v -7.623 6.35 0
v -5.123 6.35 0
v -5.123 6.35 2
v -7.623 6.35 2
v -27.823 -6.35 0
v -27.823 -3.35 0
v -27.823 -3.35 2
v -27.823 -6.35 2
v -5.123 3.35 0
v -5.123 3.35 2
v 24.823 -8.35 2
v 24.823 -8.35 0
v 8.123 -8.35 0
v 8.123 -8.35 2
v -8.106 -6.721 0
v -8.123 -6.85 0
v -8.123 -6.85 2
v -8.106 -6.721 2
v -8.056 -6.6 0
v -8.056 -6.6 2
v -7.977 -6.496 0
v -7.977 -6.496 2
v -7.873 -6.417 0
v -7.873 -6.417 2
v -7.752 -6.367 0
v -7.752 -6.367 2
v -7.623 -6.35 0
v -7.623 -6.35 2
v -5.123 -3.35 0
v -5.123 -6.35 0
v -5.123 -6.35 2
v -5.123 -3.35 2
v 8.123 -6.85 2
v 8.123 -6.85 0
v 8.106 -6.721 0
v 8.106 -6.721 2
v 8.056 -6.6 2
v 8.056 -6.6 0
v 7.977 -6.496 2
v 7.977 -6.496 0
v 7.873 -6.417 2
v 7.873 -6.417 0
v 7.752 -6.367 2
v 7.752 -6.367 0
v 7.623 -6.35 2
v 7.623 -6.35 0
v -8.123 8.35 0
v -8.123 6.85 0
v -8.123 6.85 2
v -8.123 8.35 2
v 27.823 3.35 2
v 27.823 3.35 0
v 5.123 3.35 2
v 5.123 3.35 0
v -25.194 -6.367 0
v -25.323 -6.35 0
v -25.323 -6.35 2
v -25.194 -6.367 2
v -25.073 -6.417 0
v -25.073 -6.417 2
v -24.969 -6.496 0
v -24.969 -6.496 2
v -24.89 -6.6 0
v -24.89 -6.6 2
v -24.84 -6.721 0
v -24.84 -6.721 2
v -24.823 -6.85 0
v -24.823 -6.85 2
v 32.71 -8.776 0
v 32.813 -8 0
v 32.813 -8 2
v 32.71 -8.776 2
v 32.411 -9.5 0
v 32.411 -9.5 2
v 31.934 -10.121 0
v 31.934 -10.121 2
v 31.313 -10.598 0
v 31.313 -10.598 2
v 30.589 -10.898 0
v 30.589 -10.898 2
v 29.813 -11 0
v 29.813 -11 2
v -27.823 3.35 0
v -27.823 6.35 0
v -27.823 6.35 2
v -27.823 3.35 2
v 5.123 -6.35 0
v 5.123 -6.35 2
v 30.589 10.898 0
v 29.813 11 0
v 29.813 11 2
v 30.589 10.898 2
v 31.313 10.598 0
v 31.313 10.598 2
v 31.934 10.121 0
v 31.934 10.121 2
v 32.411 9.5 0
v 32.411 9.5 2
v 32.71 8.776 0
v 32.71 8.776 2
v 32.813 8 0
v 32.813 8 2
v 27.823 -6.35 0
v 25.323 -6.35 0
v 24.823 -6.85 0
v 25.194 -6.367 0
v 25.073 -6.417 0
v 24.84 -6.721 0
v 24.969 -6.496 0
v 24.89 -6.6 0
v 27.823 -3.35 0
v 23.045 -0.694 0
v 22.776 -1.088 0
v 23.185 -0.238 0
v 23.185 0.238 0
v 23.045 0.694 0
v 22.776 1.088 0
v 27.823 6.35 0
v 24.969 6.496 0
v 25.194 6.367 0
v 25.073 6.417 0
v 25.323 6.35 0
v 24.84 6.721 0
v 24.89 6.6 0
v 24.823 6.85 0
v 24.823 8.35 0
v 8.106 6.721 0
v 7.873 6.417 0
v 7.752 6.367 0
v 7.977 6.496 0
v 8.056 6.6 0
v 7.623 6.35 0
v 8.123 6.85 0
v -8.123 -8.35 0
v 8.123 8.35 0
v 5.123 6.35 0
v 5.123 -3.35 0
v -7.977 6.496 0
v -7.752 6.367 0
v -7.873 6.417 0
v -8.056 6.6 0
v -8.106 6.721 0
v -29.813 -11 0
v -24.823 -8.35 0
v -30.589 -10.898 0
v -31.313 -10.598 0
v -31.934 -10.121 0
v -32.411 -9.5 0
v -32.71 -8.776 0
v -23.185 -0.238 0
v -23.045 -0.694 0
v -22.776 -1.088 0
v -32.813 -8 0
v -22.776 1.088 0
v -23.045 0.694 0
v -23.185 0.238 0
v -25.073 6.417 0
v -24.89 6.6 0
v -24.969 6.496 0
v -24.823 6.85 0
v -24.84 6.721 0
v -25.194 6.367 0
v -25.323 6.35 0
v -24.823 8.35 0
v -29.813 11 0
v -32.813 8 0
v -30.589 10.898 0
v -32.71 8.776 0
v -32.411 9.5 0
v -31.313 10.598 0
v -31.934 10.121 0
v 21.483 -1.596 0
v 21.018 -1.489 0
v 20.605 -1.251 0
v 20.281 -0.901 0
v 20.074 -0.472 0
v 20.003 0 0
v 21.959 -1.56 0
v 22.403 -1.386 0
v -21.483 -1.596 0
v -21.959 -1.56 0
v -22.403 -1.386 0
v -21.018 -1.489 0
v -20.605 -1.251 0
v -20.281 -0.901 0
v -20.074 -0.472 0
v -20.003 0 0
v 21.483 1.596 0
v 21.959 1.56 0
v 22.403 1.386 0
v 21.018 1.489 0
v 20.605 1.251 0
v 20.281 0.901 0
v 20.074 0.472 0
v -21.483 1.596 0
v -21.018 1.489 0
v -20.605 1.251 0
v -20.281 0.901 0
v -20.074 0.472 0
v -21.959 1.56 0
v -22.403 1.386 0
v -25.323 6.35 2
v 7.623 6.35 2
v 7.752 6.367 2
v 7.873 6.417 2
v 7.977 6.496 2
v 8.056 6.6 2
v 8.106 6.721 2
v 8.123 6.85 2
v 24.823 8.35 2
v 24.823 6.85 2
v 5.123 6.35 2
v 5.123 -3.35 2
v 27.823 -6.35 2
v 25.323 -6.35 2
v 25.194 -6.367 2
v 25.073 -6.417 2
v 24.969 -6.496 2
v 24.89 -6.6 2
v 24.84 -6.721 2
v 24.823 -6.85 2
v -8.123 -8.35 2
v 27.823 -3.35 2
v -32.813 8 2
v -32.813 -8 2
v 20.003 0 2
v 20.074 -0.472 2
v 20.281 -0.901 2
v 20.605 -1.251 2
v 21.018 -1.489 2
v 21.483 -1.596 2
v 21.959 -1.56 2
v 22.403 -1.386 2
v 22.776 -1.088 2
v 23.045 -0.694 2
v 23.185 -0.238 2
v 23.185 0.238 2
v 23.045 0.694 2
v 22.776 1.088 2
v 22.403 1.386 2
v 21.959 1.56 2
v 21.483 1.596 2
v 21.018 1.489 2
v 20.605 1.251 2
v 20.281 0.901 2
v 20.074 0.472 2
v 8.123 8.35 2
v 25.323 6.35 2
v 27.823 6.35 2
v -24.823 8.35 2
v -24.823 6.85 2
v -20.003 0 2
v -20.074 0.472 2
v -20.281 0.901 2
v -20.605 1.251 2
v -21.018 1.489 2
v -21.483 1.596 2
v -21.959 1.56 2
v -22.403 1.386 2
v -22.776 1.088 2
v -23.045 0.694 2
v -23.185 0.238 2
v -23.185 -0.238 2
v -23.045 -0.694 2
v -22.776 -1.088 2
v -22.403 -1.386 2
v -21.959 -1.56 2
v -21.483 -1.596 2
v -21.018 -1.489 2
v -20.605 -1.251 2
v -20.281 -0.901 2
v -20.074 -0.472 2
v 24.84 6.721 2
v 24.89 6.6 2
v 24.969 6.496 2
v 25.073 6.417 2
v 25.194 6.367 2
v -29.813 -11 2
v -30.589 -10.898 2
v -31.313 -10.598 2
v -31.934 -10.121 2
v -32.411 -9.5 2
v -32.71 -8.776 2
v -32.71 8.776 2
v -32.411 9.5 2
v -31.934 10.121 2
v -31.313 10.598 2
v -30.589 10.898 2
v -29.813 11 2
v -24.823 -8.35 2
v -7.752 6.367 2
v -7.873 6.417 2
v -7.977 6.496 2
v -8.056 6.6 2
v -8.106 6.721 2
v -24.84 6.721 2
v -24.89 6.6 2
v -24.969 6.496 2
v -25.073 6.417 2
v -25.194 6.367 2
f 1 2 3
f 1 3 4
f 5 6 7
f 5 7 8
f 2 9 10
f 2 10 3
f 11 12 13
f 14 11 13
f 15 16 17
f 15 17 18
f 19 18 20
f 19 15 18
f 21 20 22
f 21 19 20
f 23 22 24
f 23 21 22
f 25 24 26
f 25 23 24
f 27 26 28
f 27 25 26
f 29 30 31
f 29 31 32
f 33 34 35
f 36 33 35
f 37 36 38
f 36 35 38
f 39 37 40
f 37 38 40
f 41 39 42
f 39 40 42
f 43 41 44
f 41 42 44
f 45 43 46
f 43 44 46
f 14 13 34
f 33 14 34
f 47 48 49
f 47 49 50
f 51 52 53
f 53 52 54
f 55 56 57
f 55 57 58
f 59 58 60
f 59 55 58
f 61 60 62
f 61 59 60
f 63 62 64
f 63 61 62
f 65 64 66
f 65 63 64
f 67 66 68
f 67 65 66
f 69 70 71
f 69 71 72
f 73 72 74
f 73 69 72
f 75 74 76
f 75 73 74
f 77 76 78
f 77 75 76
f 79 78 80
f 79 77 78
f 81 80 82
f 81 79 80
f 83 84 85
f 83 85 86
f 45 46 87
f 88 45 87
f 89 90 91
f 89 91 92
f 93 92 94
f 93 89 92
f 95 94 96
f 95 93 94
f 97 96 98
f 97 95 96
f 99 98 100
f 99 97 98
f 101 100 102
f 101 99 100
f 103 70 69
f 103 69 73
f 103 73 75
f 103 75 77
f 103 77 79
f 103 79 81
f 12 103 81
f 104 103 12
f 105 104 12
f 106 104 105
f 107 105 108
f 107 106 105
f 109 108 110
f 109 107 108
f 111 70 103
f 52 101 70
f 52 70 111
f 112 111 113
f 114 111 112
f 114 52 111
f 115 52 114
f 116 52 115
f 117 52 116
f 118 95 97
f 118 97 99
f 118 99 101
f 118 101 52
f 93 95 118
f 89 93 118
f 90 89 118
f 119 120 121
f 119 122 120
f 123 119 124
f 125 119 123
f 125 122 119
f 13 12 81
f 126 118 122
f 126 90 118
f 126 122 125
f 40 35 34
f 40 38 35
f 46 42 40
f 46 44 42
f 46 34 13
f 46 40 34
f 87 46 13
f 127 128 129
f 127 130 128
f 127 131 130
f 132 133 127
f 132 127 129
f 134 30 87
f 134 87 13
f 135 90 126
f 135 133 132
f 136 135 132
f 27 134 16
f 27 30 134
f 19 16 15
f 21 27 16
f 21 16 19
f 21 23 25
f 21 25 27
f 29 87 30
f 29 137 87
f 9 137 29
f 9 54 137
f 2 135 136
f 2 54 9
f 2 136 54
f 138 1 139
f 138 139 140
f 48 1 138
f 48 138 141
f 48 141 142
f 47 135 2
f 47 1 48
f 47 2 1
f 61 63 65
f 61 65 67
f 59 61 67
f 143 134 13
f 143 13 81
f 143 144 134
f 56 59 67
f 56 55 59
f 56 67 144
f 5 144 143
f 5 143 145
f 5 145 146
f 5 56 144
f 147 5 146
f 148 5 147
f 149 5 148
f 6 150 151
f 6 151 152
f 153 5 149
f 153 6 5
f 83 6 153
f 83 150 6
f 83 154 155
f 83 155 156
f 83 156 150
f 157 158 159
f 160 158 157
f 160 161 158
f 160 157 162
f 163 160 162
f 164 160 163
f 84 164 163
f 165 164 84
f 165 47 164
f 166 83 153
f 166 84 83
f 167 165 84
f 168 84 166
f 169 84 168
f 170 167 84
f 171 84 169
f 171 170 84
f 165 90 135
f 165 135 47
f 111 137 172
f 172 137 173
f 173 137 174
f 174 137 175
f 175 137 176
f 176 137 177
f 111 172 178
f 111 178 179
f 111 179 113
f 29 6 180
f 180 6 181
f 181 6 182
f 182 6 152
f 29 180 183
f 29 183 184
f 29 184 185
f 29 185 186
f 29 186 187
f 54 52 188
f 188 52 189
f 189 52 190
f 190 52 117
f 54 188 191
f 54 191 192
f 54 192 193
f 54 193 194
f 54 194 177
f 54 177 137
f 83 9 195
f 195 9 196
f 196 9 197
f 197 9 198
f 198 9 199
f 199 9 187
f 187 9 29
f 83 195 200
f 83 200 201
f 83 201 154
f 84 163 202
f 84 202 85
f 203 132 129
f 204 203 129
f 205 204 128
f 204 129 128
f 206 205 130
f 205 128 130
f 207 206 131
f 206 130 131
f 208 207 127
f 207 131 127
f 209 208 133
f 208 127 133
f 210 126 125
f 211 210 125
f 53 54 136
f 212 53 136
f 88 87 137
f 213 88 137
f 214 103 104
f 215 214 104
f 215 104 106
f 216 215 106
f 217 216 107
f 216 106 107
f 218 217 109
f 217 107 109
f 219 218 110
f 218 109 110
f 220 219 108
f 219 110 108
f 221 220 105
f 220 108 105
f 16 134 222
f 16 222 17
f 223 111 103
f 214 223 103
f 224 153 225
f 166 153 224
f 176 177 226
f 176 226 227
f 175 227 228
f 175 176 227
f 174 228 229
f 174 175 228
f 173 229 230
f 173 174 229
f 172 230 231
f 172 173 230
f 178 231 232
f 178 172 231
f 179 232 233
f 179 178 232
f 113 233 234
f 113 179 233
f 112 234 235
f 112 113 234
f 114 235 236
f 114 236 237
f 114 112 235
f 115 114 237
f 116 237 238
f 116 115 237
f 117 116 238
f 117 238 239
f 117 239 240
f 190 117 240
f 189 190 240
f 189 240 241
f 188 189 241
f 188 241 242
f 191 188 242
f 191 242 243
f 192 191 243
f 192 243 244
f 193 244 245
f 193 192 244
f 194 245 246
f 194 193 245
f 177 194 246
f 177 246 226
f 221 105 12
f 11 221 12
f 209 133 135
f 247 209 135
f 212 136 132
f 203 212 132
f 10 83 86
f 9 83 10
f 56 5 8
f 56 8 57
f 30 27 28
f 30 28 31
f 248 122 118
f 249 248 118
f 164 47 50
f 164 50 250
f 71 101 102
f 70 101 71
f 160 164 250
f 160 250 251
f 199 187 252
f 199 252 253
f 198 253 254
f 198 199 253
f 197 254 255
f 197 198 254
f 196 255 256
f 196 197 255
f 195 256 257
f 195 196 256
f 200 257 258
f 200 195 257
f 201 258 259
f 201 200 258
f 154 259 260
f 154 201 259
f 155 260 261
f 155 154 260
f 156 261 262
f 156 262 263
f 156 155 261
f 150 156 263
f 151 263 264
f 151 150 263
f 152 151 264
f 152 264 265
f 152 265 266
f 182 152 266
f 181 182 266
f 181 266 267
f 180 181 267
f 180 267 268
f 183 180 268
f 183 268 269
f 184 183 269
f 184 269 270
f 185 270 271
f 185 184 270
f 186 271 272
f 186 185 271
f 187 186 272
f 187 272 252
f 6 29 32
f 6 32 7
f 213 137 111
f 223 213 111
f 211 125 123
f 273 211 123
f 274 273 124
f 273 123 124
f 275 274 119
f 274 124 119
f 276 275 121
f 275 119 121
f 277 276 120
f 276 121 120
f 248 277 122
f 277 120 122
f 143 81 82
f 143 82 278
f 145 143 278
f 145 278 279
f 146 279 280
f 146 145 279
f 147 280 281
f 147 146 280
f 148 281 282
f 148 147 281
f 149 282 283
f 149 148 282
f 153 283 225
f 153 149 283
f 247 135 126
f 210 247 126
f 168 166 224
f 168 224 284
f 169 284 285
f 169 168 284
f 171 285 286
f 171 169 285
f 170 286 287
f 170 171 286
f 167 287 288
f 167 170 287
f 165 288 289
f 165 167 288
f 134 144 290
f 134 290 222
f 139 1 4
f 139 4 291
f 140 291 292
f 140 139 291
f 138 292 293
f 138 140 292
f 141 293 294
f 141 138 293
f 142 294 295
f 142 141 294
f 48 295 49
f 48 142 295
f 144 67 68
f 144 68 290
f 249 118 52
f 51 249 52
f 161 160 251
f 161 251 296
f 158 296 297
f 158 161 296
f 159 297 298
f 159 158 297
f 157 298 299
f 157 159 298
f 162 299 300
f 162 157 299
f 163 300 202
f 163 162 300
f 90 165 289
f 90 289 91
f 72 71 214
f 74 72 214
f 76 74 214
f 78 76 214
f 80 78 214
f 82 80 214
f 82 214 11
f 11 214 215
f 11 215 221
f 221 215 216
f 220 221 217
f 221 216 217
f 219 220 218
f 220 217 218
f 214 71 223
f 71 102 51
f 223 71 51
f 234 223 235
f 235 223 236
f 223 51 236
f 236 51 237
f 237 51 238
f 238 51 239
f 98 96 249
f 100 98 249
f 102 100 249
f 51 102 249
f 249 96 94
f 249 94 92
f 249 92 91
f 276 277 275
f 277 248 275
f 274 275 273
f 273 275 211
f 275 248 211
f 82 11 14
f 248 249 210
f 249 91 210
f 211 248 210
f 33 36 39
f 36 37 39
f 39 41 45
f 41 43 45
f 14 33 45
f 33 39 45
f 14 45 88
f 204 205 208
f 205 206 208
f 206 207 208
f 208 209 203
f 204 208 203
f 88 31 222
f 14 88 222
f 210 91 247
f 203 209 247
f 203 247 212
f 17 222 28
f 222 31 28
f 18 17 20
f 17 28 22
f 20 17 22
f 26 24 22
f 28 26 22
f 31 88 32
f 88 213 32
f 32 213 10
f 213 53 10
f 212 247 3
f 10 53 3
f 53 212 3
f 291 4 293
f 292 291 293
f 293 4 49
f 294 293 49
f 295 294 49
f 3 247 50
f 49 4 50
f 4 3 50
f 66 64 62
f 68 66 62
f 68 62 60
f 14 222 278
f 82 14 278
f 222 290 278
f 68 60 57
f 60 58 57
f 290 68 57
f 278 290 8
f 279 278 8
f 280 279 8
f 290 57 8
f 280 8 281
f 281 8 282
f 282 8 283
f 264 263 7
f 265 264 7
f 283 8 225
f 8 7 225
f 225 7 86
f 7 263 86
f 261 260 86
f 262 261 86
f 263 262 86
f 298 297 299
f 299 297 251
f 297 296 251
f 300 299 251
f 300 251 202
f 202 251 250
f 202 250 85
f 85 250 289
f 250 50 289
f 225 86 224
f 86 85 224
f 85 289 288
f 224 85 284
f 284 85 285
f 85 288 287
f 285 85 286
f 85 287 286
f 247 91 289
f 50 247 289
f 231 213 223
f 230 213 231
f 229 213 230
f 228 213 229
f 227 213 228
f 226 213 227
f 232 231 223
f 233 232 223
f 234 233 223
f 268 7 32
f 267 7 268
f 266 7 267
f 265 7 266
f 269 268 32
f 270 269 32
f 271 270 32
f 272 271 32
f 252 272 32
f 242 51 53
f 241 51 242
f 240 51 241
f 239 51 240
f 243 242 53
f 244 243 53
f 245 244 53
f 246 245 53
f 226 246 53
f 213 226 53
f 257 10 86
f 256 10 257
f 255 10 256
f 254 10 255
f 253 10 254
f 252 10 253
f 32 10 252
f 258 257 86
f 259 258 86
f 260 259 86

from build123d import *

# Parameters (mm, degrees)
SKETCH_1_R      = 1.6
EXTRUDE_1_DEPTH = 2


with BuildPart() as part:
    # 草图1 → 凸台-拉伸1 (new body)
    with BuildSketch(Plane.XY):
        with BuildLine():
            Line((-29.812520549, 11), (29.812520549, 11))
            ThreePointArc((29.812520549, 11), (31.933840892, 10.121320344), (32.812520549, 8))
            Line((32.812520549, 8), (32.812520549, -8))
            ThreePointArc((32.812520549, -8), (31.933840892, -10.121320344), (29.812520549, -11))
            Line((29.812520549, -11), (-29.812520549, -11))
            ThreePointArc((-29.812520549, -11), (-31.933840892, -10.121320344), (-32.812520549, -8))
            Line((-32.812520549, -8), (-32.812520549, 8))
            ThreePointArc((-32.812520549, 8), (-31.933840892, 10.121320344), (-29.812520549, 11))
        make_face()
        with Locations((-21.602967139, 3e-09)):
            Circle(SKETCH_1_R, mode=Mode.SUBTRACT)
        with Locations(Location((21.602967139, 3e-09, 0), (0, 0, 180))):
            Circle(SKETCH_1_R, mode=Mode.SUBTRACT)
        with BuildLine():
            Line((-27.82296712, -6.350000006), (-25.322967139, -6.350000006))
            ThreePointArc((-25.322967139, -6.350000006), (-24.969413752, -6.496446613), (-24.822967144, -6.850000001))
            Line((-24.822967144, -6.850000001), (-24.822967144, -8.350000009))
            Line((-24.822967144, -8.350000009), (-8.122967147, -8.350000009))
            Line((-8.122967147, -8.350000009), (-8.122967147, -6.850000006))
            ThreePointArc((-8.122967147, -6.850000006), (-7.976520539, -6.496446619), (-7.622967152, -6.350000011))
            Line((-7.622967152, -6.350000011), (-5.122967162, -6.350000011))
            Line((-5.122967162, -6.350000011), (-5.122967162, -3.349999976))
            Line((-5.122967162, -3.349999976), (-27.82296712, -3.349999976))
            Line((-27.82296712, -3.349999976), (-27.82296712, -6.350000006))
        make_face(mode=Mode.SUBTRACT)
        with BuildLine():
            Line((-8.12296715, 8.350000017), (-24.822967148, 8.350000017))
            Line((-24.822967148, 8.350000017), (-24.822967148, 6.850000008))
            ThreePointArc((-24.822967148, 6.850000008), (-24.969413756, 6.496446621), (-25.322967143, 6.350000013))
            Line((-25.322967143, 6.350000013), (-27.822967124, 6.350000013))
            Line((-27.822967124, 6.350000013), (-27.822967124, 3.349999975))
            Line((-27.822967124, 3.349999975), (-5.122967149, 3.349999975))
            Line((-5.122967149, 3.349999975), (-5.122967149, 6.350000013))
            Line((-5.122967149, 6.350000013), (-7.622967155, 6.350000013))
            ThreePointArc((-7.622967155, 6.350000013), (-7.976520542, 6.496446621), (-8.12296715, 6.850000008))
            Line((-8.12296715, 6.850000008), (-8.12296715, 8.350000017))
        make_face(mode=Mode.SUBTRACT)
        with BuildLine():
            Line((24.822967148, 8.350000017), (24.822967148, 6.850000008))
            ThreePointArc((24.822967148, 6.850000008), (24.969413756, 6.496446621), (25.322967143, 6.350000013))
            Line((25.322967143, 6.350000013), (27.822967124, 6.350000013))
            Line((27.822967124, 6.350000013), (27.822967124, 3.349999975))
            Line((27.822967124, 3.349999975), (5.122967149, 3.349999975))
            Line((5.122967149, 3.349999975), (5.122967149, 6.350000013))
            Line((5.122967149, 6.350000013), (7.622967155, 6.350000013))
            ThreePointArc((7.622967155, 6.350000013), (7.976520542, 6.496446621), (8.12296715, 6.850000008))
            Line((8.12296715, 6.850000008), (8.12296715, 8.350000017))
            Line((8.12296715, 8.350000017), (24.822967148, 8.350000017))
        make_face(mode=Mode.SUBTRACT)
        with BuildLine():
            Line((24.822967144, -6.850000001), (24.822967144, -8.350000009))
            Line((24.822967144, -8.350000009), (8.122967147, -8.350000009))
            Line((8.122967147, -8.350000009), (8.122967147, -6.850000006))
            ThreePointArc((8.122967147, -6.850000006), (7.976520539, -6.496446619), (7.622967152, -6.350000011))
            Line((7.622967152, -6.350000011), (5.122967162, -6.350000011))
            Line((5.122967162, -6.350000011), (5.122967162, -3.349999976))
            Line((5.122967162, -3.349999976), (27.82296712, -3.349999976))
            Line((27.82296712, -3.349999976), (27.82296712, -6.350000006))
            Line((27.82296712, -6.350000006), (25.322967139, -6.350000006))
            ThreePointArc((25.322967139, -6.350000006), (24.969413752, -6.496446613), (24.822967144, -6.850000001))
        make_face(mode=Mode.SUBTRACT)
    extrude(amount=EXTRUDE_1_DEPTH)


solid = part.part
